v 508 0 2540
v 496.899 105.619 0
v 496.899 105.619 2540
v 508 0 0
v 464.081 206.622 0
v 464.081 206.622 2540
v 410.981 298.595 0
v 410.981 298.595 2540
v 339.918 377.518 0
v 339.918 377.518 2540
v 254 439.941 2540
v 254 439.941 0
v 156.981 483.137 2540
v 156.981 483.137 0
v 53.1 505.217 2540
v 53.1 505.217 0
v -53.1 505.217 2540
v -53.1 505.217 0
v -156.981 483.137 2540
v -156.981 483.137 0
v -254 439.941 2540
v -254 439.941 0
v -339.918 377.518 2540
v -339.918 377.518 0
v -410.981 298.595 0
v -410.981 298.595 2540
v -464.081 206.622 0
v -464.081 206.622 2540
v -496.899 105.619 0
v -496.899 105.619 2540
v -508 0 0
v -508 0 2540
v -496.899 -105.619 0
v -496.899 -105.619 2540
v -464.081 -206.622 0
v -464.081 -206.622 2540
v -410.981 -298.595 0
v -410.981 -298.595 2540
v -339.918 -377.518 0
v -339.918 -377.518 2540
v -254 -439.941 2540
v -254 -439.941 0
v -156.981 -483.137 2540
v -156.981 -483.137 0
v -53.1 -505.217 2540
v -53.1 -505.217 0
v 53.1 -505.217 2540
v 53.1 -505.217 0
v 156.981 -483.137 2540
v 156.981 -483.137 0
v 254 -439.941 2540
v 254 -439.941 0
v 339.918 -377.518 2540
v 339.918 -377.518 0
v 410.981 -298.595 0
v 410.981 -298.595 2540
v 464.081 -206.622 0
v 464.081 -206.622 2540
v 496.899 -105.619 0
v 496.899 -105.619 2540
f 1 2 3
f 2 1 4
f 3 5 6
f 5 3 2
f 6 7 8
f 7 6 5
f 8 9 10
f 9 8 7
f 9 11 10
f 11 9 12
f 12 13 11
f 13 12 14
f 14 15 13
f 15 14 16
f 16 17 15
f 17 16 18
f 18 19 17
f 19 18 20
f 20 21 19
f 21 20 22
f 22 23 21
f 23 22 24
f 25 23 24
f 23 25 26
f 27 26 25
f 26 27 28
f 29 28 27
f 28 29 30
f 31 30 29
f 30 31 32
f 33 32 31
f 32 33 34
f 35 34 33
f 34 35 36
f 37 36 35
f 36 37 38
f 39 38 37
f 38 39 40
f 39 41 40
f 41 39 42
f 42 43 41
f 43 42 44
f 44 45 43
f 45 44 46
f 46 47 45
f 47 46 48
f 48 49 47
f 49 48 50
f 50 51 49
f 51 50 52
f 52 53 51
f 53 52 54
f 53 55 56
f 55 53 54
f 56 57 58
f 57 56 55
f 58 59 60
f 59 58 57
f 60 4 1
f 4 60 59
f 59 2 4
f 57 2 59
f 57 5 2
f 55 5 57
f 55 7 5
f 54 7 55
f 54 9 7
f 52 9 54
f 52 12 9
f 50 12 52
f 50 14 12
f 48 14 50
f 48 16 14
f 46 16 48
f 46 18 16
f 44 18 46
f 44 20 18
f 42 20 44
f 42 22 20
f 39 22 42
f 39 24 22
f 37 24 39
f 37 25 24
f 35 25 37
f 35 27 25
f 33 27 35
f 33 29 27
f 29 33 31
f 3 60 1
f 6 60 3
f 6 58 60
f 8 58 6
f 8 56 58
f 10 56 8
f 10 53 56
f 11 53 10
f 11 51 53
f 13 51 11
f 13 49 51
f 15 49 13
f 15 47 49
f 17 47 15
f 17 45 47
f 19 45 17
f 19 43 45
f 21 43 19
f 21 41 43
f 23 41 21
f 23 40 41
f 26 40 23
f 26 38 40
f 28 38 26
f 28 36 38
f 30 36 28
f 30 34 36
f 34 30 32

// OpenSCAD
// Unit of length: Unit.MM
cylinder(h = 2540.0, r = 508.0, center = false, $fa = 12.0, $fs = 50.8, $fn = 0);
